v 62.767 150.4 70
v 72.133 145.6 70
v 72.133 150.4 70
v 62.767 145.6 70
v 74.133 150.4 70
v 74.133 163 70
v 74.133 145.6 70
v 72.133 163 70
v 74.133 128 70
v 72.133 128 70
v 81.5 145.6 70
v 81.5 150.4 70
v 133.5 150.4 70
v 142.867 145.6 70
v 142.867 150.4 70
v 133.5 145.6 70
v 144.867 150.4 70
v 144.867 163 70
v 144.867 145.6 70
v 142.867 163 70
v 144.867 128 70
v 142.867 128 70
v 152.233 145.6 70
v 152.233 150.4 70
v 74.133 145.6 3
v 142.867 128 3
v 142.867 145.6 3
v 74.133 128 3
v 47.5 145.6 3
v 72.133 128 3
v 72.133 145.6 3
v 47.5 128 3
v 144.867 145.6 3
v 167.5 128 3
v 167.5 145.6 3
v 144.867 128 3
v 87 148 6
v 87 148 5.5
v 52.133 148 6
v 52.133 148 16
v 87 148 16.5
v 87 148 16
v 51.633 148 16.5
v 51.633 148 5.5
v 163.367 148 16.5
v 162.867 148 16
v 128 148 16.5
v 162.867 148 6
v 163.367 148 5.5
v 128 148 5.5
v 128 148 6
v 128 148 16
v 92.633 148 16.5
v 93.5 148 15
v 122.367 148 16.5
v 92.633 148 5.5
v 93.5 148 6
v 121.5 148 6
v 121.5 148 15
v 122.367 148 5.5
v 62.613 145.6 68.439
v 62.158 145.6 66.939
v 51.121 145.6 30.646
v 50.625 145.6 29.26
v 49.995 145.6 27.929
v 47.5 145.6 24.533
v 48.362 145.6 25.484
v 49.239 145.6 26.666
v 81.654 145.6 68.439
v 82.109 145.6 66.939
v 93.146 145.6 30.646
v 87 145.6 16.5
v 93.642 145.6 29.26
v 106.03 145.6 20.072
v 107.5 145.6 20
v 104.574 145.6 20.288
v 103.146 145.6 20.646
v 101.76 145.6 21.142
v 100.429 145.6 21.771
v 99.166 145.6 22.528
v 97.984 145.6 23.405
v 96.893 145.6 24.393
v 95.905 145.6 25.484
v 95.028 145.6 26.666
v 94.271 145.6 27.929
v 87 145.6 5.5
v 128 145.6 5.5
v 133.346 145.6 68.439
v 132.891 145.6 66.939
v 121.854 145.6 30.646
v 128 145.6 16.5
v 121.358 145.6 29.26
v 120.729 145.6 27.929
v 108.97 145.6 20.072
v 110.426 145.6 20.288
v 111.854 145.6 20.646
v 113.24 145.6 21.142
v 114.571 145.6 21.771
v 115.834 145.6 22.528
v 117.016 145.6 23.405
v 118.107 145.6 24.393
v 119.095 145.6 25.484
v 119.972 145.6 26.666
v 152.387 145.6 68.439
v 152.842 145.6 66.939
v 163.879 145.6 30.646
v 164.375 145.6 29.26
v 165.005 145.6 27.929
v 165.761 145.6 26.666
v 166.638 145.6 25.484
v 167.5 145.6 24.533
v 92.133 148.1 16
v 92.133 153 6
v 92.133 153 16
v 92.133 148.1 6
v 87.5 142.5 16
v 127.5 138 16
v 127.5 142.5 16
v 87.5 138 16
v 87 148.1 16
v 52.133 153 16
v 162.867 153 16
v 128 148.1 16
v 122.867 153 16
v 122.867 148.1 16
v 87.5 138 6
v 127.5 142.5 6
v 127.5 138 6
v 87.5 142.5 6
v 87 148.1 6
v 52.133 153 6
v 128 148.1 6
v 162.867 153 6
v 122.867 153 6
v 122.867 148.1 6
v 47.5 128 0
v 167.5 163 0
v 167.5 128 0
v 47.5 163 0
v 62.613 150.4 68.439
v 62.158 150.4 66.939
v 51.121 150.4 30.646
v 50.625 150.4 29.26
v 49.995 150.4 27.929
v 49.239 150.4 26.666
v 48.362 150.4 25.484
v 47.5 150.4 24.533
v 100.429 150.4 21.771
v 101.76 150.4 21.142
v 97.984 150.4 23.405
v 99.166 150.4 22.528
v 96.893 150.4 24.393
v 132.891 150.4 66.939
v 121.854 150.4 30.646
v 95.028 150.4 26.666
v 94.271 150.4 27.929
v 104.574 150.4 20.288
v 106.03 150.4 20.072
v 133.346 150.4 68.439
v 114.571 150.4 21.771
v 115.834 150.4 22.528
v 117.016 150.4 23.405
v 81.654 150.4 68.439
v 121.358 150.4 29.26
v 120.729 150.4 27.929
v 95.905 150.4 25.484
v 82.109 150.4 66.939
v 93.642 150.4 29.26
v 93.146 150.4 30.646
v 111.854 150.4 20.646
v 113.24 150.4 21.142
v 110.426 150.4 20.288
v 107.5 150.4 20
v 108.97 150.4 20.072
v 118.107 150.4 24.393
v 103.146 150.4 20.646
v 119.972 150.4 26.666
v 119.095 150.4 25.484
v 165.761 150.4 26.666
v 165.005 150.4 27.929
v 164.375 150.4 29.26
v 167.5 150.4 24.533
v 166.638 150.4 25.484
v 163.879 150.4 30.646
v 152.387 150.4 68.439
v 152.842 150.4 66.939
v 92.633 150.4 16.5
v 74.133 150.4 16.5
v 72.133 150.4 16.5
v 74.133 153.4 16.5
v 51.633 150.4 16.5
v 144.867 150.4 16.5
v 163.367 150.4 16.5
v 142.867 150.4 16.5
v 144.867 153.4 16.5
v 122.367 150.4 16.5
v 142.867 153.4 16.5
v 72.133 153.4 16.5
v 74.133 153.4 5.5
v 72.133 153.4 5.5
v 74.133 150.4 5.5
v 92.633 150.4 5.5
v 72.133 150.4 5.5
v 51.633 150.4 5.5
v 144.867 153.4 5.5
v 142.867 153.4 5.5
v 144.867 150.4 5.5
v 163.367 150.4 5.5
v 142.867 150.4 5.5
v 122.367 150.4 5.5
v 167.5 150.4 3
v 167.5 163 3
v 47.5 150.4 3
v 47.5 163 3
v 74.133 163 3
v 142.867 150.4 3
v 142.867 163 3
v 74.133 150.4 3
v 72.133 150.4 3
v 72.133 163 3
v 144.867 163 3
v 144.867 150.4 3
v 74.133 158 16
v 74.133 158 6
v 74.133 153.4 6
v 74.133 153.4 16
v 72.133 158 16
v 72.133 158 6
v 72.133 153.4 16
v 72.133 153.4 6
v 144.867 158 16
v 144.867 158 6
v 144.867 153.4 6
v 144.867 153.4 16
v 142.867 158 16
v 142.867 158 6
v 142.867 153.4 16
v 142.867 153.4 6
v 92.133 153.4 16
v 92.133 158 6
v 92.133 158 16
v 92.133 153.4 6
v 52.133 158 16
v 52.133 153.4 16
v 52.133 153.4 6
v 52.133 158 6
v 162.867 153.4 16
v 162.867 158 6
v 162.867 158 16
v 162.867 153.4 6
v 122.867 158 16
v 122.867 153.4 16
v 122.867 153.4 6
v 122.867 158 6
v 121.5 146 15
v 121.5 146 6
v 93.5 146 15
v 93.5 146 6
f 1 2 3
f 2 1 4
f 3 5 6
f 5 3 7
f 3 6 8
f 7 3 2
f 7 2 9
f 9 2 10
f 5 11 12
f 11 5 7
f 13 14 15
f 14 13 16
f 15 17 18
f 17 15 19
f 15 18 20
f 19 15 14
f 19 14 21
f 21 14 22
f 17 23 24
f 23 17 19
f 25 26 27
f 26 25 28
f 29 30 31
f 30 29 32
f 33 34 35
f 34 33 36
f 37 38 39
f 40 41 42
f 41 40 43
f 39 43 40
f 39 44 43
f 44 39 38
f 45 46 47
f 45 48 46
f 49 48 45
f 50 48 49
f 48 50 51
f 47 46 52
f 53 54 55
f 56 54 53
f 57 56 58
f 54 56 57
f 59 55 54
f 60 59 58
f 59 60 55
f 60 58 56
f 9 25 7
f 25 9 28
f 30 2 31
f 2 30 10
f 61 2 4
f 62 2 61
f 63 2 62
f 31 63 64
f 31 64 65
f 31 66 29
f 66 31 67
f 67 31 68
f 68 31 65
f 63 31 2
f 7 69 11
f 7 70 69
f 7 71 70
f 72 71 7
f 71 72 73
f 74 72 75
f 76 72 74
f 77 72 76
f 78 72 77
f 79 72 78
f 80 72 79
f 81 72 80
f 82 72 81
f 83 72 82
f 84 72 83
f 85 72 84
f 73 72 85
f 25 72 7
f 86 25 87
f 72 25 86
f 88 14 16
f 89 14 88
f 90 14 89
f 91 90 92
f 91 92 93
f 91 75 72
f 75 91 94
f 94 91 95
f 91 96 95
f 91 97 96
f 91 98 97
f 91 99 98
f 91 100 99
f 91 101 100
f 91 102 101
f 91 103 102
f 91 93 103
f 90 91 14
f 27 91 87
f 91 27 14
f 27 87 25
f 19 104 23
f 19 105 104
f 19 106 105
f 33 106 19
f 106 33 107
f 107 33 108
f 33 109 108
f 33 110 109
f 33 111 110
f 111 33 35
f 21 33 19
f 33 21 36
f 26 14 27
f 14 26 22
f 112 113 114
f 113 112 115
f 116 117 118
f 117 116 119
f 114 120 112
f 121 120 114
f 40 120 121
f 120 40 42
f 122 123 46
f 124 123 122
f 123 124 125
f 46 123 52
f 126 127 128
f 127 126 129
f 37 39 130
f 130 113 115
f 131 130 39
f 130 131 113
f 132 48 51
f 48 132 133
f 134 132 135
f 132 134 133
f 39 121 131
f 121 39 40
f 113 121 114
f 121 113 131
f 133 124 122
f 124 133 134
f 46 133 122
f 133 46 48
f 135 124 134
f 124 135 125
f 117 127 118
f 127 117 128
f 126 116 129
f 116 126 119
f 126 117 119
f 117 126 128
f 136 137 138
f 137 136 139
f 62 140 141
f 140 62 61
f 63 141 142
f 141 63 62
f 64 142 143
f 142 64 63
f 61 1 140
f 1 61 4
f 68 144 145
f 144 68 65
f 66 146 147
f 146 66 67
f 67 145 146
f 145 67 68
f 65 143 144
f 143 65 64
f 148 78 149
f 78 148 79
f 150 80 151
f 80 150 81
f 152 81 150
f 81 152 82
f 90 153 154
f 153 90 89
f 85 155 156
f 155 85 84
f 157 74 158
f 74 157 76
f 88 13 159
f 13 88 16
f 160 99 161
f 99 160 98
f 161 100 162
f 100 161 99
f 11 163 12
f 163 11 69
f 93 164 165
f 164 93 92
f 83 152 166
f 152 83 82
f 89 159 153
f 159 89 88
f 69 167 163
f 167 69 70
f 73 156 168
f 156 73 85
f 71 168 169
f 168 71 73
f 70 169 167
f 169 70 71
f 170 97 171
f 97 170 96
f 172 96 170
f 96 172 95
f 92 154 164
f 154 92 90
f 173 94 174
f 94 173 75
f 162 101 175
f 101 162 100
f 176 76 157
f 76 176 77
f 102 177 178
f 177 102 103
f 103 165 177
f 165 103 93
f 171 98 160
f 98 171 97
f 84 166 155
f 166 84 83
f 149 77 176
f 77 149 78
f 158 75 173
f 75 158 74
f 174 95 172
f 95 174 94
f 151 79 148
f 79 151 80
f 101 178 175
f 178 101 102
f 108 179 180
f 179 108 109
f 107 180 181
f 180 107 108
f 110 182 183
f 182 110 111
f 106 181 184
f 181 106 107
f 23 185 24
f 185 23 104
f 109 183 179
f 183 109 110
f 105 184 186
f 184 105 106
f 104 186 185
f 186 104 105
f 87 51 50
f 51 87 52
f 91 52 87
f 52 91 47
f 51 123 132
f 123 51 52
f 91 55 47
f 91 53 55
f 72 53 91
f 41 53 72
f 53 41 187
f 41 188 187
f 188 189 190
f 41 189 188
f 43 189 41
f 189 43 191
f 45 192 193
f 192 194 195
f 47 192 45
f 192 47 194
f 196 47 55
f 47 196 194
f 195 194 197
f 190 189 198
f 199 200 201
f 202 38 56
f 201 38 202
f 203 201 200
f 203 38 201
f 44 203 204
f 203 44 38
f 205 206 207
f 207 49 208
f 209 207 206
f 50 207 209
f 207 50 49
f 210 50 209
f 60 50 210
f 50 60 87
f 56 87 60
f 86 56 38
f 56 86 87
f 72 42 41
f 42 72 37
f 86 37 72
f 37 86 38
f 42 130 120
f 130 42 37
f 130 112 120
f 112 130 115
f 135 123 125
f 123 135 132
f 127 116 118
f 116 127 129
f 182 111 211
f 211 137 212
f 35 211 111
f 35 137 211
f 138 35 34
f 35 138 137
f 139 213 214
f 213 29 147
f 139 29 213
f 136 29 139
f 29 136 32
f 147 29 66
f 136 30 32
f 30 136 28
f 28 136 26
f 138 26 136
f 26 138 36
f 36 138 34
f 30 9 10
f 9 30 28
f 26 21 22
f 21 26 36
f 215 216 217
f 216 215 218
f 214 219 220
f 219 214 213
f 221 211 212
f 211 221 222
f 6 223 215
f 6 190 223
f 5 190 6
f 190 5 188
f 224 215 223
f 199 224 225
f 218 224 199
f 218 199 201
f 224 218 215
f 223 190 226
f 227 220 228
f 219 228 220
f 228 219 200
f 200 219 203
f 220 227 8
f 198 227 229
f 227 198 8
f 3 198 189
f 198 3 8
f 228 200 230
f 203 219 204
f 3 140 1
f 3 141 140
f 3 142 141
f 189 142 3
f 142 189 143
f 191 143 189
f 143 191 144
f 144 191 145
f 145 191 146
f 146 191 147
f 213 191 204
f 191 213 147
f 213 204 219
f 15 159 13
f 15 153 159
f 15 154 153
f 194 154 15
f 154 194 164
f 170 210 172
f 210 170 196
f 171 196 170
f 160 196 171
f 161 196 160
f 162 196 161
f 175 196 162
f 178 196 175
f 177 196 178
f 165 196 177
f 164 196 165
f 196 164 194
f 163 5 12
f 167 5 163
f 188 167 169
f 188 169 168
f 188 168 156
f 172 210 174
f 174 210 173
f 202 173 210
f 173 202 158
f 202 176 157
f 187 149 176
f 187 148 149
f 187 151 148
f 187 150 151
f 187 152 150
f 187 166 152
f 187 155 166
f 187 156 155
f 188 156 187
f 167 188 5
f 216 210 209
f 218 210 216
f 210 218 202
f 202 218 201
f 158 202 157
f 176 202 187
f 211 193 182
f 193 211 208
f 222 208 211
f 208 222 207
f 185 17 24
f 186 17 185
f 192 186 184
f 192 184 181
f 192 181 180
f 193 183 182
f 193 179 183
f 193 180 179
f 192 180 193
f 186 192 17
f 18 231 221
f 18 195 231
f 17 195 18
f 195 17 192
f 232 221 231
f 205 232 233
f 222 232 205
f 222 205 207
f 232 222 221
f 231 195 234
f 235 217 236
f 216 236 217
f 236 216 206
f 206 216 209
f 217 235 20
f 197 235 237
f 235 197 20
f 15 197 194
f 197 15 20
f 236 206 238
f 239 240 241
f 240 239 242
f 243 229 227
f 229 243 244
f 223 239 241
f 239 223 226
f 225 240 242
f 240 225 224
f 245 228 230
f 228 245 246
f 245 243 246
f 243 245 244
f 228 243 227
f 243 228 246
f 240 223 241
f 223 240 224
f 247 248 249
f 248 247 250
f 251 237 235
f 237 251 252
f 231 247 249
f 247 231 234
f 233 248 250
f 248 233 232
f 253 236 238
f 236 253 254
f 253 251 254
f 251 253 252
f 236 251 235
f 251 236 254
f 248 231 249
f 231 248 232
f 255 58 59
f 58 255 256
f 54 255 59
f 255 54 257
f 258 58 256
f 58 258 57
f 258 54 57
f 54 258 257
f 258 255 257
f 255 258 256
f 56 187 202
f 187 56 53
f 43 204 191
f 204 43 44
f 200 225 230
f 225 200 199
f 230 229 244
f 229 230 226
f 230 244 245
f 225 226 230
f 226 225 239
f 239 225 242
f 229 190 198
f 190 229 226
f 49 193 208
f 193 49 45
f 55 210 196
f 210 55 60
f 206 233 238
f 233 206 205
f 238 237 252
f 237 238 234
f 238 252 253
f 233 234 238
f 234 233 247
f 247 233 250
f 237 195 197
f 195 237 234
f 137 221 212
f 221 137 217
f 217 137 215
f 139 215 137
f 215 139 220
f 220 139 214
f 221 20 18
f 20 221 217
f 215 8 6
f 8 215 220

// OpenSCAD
// file: lattice_wall.scad
// lattice_wall.scad

// Front/back walls: run along X, thickness in Y, height in Z
module lattice_wall(len, ht, thick, gap=12, strand=1.6) {
    pitch = gap + strand;
    difference() {
        cube([len, thick, ht]);
        for (xi = [pitch : pitch : len - pitch/2],
             zi = [pitch : pitch : ht  - pitch/2])
            // Centre cut in wall thickness so it pierces all the way through
            translate([xi, thick/2, zi])
                rotate([0, 45, 0])
                    cube([gap*0.707, thick+0.4, gap*0.707], center=true);
    }
}

// Side walls: run along Y, thickness in X, height in Z
module lattice_wall_y(len, ht, thick, gap=12, strand=1.6) {
    pitch = gap + strand;
    difference() {
        cube([thick, len, ht]);
        for (yi = [pitch : pitch : len - pitch/2],
             zi = [pitch : pitch : ht  - pitch/2])
            translate([thick/2, yi, zi])
                rotate([45, 0, 0])
                    cube([thick+0.4, gap*0.707, gap*0.707], center=true);
    }
}
// file: caddy_params.scad
use <lattice_wall.scad>

// --- Overall dimensions ---
total_w = 215;
half_d  = 148;
wall_h  = 70;
cols    = 3;
rows    = 2;
ow      = 2.4;    // outer wall thickness
dt      = 2.0;    // divider thickness
bt      = 3.0;    // base thickness

cell_w = (total_w - 2*ow - (cols-1)*dt) / cols;
cell_d = (half_d  - 2*ow - dt) / rows;

// --- Lattice (side walls only) ---
lat_gap    = 12;
lat_strand = 1.6;

// --- Finger-cutout geometry ---
// Profile Y=0 is arc centre; arc dips to Y=-uc_bot_w/2.
// uc_z_off maps profile-Y to world-Z: world-Z = profile-Y + uc_z_off
//   arc bottom  world-Z = uc_z_off - uc_bot_w/2 = 35 - 15 = 20 mm
//   top of profile world-Z = 35 + 40 = 75 > wall_h = 70 (guaranteed open)
uc_bot_w = 30;    // bottom semicircle diameter
uc_top_w = 36;    // distance between top-corner circle centres
uc_cr    = 8;     // top-corner circle radius (also controls how far above wall the cut exits)
uc_z_off = 35;    // Z offset: arc bottom lands at Z = uc_z_off - uc_bot_w/2 = 20

// Profile-Y at wall top (world-Z = wall_h = 70)
uc_y_wt  = wall_h - uc_z_off;   // = 35

// --- Tongue/groove joint ---
tl  = 40;
th  = 10;
tt  = 5;
tol = 0.5;

// Back half centre tongue — sized to fit as-printed front groove (30mm wide, 11mm tall, ~2.5mm deep)
tl_c = 28;   // 1mm clearance each side of 30mm opening
th_c = 9;    // 1mm clearance each side of 11mm opening
tt_c = 2;    // conservative fit for ~2.5mm groove depth

function ccx(i) = ow + i*(cell_w + dt) + cell_w/2;

tx1 = ow + cell_w + dt/2;
tx2 = ow + 2*(cell_w + dt) - dt/2;
tx_c = total_w / 2;

// --- 2-D U-profile ---
// Hull of bottom half-circle + two side circles at wall-top level.
// The side circles are centred at (+-uc_top_w/2, uc_y_wt) -- IN the solid
// wall material -- so the hull curve sweeps smoothly from solid into U.
// Profile is widest at uc_y_wt (wall top) and tapers down to uc_bot_w.
// Circles reach Y = uc_y_wt + uc_cr = 43, mapping to world-Z = 78 > 70
// so the cut is guaranteed to break through the wall top with no hard edge.
module u_profile_2d() {
    hull() {
        // Bottom half-circle (dips below Y=0)
        intersection() {
            circle(r = uc_bot_w/2, $fn = 64);
            translate([-(uc_bot_w/2 + 1), -uc_bot_w])
                square([uc_bot_w + 2, uc_bot_w]);
        }
        // Top-corner circles: centres in solid wall, arcs sweep into U
        translate([ uc_top_w/2, uc_y_wt]) circle(r = uc_cr, $fn = 32);
        translate([-uc_top_w/2, uc_y_wt]) circle(r = uc_cr, $fn = 32);
    }
}

// --- 3-D cutout through wall of thickness wt ---
module u_cut(wt) {
    translate([0, wt + 0.1, uc_z_off])
        rotate([90, 0, 0])
            linear_extrude(wt + 0.2)
                u_profile_2d();
}

// --- Half-tray ---
// Front/back walls: SOLID (U cutouts print better in solid walls)
// Side walls: lattice (no cutouts, decorative/lightweight)
// 2+1 tongue scheme:
//   Front: 2 tongues (tx1,tx2) + 1 centre groove
//   Back:  2 grooves (tx1,tx2) + 1 centre tongue
module caddy_half(is_front = true) {
    wy_back = half_d - ow;
    wy_div  = ow + cell_d;

    difference() {
        union() {
            // Base
            cube([total_w, half_d, bt]);
            // Front outer wall -- SOLID
            translate([0, 0, bt])
                cube([total_w, ow, wall_h - bt]);
            // Back outer wall -- SOLID
            translate([0, wy_back, bt])
                cube([total_w, ow, wall_h - bt]);
            // Left side wall -- LATTICE
            translate([0, 0, bt])
                lattice_wall_y(half_d, wall_h - bt, ow, lat_gap, lat_strand);
            // Right side wall -- LATTICE
            translate([total_w - ow, 0, bt])
                lattice_wall_y(half_d, wall_h - bt, ow, lat_gap, lat_strand);
            // Vertical column dividers (solid)
            for (i = [1 : cols-1])
                translate([ow + i*(cell_w + dt) - dt/2, ow, bt])
                    cube([dt, half_d - 2*ow, wall_h - bt]);
            // Horizontal row divider (solid)
            translate([ow, wy_div, bt])
                cube([total_w - 2*ow, dt, wall_h - bt]);

            // Joint geometry
            if (is_front) {
                translate([tx1 - tl/2, half_d,         bt+3]) cube([tl, tt,    th]);
                translate([tx2 - tl/2, half_d,         bt+3]) cube([tl, tt,    th]);
                translate([tx_c - tl/2, half_d - tt*2, bt+3]) cube([tl, tt*2,  th]);
            } else {
                translate([tx1 - tl/2, 0, bt+3]) cube([tl, tt*2, th]);
                translate([tx2 - tl/2, 0, bt+3]) cube([tl, tt*2, th]);
                translate([tx_c - tl_c/2, -tt_c, bt+3]) cube([tl_c, tt_c, th_c]);
            }
        }

        // U cutouts
        for (i = [0 : cols-1]) translate([ccx(i), 0,       0]) u_cut(ow);
        for (i = [0 : cols-1]) translate([ccx(i), wy_back, 0]) u_cut(ow);
        for (i = [0 : cols-1]) translate([ccx(i), wy_div,  0]) u_cut(dt);

        // Groove cuts
        if (is_front) {
            translate([tx_c - tl/2 - tol, half_d - tt - tol, bt+3 - tol])
                cube([tl + 2*tol, tt + tol + 0.1, th + 2*tol]);
        } else {
            translate([tx1 - tl/2 - tol, -0.1, bt+3 - tol])
                cube([tl + 2*tol, tt + tol, th + 2*tol]);
            translate([tx2 - tl/2 - tol, -0.1, bt+3 - tol])
                cube([tl + 2*tol, tt + tol, th + 2*tol]);
        }
    }
}
// main file
// Joint area detail — front half joint face + back half joint face side by side
include <caddy_params.scad>

// Front half, clipped to just the joint region
intersection() {
    caddy_half(is_front = true);
    translate([tx_c - 60, half_d - 20, 0]) cube([120, 25, wall_h]);
}

// Back half joint face, placed adjacent
translate([0, half_d, 0])
intersection() {
    caddy_half(is_front = false);
    translate([tx_c - 60, -5, 0]) cube([120, 20, wall_h]);
}
